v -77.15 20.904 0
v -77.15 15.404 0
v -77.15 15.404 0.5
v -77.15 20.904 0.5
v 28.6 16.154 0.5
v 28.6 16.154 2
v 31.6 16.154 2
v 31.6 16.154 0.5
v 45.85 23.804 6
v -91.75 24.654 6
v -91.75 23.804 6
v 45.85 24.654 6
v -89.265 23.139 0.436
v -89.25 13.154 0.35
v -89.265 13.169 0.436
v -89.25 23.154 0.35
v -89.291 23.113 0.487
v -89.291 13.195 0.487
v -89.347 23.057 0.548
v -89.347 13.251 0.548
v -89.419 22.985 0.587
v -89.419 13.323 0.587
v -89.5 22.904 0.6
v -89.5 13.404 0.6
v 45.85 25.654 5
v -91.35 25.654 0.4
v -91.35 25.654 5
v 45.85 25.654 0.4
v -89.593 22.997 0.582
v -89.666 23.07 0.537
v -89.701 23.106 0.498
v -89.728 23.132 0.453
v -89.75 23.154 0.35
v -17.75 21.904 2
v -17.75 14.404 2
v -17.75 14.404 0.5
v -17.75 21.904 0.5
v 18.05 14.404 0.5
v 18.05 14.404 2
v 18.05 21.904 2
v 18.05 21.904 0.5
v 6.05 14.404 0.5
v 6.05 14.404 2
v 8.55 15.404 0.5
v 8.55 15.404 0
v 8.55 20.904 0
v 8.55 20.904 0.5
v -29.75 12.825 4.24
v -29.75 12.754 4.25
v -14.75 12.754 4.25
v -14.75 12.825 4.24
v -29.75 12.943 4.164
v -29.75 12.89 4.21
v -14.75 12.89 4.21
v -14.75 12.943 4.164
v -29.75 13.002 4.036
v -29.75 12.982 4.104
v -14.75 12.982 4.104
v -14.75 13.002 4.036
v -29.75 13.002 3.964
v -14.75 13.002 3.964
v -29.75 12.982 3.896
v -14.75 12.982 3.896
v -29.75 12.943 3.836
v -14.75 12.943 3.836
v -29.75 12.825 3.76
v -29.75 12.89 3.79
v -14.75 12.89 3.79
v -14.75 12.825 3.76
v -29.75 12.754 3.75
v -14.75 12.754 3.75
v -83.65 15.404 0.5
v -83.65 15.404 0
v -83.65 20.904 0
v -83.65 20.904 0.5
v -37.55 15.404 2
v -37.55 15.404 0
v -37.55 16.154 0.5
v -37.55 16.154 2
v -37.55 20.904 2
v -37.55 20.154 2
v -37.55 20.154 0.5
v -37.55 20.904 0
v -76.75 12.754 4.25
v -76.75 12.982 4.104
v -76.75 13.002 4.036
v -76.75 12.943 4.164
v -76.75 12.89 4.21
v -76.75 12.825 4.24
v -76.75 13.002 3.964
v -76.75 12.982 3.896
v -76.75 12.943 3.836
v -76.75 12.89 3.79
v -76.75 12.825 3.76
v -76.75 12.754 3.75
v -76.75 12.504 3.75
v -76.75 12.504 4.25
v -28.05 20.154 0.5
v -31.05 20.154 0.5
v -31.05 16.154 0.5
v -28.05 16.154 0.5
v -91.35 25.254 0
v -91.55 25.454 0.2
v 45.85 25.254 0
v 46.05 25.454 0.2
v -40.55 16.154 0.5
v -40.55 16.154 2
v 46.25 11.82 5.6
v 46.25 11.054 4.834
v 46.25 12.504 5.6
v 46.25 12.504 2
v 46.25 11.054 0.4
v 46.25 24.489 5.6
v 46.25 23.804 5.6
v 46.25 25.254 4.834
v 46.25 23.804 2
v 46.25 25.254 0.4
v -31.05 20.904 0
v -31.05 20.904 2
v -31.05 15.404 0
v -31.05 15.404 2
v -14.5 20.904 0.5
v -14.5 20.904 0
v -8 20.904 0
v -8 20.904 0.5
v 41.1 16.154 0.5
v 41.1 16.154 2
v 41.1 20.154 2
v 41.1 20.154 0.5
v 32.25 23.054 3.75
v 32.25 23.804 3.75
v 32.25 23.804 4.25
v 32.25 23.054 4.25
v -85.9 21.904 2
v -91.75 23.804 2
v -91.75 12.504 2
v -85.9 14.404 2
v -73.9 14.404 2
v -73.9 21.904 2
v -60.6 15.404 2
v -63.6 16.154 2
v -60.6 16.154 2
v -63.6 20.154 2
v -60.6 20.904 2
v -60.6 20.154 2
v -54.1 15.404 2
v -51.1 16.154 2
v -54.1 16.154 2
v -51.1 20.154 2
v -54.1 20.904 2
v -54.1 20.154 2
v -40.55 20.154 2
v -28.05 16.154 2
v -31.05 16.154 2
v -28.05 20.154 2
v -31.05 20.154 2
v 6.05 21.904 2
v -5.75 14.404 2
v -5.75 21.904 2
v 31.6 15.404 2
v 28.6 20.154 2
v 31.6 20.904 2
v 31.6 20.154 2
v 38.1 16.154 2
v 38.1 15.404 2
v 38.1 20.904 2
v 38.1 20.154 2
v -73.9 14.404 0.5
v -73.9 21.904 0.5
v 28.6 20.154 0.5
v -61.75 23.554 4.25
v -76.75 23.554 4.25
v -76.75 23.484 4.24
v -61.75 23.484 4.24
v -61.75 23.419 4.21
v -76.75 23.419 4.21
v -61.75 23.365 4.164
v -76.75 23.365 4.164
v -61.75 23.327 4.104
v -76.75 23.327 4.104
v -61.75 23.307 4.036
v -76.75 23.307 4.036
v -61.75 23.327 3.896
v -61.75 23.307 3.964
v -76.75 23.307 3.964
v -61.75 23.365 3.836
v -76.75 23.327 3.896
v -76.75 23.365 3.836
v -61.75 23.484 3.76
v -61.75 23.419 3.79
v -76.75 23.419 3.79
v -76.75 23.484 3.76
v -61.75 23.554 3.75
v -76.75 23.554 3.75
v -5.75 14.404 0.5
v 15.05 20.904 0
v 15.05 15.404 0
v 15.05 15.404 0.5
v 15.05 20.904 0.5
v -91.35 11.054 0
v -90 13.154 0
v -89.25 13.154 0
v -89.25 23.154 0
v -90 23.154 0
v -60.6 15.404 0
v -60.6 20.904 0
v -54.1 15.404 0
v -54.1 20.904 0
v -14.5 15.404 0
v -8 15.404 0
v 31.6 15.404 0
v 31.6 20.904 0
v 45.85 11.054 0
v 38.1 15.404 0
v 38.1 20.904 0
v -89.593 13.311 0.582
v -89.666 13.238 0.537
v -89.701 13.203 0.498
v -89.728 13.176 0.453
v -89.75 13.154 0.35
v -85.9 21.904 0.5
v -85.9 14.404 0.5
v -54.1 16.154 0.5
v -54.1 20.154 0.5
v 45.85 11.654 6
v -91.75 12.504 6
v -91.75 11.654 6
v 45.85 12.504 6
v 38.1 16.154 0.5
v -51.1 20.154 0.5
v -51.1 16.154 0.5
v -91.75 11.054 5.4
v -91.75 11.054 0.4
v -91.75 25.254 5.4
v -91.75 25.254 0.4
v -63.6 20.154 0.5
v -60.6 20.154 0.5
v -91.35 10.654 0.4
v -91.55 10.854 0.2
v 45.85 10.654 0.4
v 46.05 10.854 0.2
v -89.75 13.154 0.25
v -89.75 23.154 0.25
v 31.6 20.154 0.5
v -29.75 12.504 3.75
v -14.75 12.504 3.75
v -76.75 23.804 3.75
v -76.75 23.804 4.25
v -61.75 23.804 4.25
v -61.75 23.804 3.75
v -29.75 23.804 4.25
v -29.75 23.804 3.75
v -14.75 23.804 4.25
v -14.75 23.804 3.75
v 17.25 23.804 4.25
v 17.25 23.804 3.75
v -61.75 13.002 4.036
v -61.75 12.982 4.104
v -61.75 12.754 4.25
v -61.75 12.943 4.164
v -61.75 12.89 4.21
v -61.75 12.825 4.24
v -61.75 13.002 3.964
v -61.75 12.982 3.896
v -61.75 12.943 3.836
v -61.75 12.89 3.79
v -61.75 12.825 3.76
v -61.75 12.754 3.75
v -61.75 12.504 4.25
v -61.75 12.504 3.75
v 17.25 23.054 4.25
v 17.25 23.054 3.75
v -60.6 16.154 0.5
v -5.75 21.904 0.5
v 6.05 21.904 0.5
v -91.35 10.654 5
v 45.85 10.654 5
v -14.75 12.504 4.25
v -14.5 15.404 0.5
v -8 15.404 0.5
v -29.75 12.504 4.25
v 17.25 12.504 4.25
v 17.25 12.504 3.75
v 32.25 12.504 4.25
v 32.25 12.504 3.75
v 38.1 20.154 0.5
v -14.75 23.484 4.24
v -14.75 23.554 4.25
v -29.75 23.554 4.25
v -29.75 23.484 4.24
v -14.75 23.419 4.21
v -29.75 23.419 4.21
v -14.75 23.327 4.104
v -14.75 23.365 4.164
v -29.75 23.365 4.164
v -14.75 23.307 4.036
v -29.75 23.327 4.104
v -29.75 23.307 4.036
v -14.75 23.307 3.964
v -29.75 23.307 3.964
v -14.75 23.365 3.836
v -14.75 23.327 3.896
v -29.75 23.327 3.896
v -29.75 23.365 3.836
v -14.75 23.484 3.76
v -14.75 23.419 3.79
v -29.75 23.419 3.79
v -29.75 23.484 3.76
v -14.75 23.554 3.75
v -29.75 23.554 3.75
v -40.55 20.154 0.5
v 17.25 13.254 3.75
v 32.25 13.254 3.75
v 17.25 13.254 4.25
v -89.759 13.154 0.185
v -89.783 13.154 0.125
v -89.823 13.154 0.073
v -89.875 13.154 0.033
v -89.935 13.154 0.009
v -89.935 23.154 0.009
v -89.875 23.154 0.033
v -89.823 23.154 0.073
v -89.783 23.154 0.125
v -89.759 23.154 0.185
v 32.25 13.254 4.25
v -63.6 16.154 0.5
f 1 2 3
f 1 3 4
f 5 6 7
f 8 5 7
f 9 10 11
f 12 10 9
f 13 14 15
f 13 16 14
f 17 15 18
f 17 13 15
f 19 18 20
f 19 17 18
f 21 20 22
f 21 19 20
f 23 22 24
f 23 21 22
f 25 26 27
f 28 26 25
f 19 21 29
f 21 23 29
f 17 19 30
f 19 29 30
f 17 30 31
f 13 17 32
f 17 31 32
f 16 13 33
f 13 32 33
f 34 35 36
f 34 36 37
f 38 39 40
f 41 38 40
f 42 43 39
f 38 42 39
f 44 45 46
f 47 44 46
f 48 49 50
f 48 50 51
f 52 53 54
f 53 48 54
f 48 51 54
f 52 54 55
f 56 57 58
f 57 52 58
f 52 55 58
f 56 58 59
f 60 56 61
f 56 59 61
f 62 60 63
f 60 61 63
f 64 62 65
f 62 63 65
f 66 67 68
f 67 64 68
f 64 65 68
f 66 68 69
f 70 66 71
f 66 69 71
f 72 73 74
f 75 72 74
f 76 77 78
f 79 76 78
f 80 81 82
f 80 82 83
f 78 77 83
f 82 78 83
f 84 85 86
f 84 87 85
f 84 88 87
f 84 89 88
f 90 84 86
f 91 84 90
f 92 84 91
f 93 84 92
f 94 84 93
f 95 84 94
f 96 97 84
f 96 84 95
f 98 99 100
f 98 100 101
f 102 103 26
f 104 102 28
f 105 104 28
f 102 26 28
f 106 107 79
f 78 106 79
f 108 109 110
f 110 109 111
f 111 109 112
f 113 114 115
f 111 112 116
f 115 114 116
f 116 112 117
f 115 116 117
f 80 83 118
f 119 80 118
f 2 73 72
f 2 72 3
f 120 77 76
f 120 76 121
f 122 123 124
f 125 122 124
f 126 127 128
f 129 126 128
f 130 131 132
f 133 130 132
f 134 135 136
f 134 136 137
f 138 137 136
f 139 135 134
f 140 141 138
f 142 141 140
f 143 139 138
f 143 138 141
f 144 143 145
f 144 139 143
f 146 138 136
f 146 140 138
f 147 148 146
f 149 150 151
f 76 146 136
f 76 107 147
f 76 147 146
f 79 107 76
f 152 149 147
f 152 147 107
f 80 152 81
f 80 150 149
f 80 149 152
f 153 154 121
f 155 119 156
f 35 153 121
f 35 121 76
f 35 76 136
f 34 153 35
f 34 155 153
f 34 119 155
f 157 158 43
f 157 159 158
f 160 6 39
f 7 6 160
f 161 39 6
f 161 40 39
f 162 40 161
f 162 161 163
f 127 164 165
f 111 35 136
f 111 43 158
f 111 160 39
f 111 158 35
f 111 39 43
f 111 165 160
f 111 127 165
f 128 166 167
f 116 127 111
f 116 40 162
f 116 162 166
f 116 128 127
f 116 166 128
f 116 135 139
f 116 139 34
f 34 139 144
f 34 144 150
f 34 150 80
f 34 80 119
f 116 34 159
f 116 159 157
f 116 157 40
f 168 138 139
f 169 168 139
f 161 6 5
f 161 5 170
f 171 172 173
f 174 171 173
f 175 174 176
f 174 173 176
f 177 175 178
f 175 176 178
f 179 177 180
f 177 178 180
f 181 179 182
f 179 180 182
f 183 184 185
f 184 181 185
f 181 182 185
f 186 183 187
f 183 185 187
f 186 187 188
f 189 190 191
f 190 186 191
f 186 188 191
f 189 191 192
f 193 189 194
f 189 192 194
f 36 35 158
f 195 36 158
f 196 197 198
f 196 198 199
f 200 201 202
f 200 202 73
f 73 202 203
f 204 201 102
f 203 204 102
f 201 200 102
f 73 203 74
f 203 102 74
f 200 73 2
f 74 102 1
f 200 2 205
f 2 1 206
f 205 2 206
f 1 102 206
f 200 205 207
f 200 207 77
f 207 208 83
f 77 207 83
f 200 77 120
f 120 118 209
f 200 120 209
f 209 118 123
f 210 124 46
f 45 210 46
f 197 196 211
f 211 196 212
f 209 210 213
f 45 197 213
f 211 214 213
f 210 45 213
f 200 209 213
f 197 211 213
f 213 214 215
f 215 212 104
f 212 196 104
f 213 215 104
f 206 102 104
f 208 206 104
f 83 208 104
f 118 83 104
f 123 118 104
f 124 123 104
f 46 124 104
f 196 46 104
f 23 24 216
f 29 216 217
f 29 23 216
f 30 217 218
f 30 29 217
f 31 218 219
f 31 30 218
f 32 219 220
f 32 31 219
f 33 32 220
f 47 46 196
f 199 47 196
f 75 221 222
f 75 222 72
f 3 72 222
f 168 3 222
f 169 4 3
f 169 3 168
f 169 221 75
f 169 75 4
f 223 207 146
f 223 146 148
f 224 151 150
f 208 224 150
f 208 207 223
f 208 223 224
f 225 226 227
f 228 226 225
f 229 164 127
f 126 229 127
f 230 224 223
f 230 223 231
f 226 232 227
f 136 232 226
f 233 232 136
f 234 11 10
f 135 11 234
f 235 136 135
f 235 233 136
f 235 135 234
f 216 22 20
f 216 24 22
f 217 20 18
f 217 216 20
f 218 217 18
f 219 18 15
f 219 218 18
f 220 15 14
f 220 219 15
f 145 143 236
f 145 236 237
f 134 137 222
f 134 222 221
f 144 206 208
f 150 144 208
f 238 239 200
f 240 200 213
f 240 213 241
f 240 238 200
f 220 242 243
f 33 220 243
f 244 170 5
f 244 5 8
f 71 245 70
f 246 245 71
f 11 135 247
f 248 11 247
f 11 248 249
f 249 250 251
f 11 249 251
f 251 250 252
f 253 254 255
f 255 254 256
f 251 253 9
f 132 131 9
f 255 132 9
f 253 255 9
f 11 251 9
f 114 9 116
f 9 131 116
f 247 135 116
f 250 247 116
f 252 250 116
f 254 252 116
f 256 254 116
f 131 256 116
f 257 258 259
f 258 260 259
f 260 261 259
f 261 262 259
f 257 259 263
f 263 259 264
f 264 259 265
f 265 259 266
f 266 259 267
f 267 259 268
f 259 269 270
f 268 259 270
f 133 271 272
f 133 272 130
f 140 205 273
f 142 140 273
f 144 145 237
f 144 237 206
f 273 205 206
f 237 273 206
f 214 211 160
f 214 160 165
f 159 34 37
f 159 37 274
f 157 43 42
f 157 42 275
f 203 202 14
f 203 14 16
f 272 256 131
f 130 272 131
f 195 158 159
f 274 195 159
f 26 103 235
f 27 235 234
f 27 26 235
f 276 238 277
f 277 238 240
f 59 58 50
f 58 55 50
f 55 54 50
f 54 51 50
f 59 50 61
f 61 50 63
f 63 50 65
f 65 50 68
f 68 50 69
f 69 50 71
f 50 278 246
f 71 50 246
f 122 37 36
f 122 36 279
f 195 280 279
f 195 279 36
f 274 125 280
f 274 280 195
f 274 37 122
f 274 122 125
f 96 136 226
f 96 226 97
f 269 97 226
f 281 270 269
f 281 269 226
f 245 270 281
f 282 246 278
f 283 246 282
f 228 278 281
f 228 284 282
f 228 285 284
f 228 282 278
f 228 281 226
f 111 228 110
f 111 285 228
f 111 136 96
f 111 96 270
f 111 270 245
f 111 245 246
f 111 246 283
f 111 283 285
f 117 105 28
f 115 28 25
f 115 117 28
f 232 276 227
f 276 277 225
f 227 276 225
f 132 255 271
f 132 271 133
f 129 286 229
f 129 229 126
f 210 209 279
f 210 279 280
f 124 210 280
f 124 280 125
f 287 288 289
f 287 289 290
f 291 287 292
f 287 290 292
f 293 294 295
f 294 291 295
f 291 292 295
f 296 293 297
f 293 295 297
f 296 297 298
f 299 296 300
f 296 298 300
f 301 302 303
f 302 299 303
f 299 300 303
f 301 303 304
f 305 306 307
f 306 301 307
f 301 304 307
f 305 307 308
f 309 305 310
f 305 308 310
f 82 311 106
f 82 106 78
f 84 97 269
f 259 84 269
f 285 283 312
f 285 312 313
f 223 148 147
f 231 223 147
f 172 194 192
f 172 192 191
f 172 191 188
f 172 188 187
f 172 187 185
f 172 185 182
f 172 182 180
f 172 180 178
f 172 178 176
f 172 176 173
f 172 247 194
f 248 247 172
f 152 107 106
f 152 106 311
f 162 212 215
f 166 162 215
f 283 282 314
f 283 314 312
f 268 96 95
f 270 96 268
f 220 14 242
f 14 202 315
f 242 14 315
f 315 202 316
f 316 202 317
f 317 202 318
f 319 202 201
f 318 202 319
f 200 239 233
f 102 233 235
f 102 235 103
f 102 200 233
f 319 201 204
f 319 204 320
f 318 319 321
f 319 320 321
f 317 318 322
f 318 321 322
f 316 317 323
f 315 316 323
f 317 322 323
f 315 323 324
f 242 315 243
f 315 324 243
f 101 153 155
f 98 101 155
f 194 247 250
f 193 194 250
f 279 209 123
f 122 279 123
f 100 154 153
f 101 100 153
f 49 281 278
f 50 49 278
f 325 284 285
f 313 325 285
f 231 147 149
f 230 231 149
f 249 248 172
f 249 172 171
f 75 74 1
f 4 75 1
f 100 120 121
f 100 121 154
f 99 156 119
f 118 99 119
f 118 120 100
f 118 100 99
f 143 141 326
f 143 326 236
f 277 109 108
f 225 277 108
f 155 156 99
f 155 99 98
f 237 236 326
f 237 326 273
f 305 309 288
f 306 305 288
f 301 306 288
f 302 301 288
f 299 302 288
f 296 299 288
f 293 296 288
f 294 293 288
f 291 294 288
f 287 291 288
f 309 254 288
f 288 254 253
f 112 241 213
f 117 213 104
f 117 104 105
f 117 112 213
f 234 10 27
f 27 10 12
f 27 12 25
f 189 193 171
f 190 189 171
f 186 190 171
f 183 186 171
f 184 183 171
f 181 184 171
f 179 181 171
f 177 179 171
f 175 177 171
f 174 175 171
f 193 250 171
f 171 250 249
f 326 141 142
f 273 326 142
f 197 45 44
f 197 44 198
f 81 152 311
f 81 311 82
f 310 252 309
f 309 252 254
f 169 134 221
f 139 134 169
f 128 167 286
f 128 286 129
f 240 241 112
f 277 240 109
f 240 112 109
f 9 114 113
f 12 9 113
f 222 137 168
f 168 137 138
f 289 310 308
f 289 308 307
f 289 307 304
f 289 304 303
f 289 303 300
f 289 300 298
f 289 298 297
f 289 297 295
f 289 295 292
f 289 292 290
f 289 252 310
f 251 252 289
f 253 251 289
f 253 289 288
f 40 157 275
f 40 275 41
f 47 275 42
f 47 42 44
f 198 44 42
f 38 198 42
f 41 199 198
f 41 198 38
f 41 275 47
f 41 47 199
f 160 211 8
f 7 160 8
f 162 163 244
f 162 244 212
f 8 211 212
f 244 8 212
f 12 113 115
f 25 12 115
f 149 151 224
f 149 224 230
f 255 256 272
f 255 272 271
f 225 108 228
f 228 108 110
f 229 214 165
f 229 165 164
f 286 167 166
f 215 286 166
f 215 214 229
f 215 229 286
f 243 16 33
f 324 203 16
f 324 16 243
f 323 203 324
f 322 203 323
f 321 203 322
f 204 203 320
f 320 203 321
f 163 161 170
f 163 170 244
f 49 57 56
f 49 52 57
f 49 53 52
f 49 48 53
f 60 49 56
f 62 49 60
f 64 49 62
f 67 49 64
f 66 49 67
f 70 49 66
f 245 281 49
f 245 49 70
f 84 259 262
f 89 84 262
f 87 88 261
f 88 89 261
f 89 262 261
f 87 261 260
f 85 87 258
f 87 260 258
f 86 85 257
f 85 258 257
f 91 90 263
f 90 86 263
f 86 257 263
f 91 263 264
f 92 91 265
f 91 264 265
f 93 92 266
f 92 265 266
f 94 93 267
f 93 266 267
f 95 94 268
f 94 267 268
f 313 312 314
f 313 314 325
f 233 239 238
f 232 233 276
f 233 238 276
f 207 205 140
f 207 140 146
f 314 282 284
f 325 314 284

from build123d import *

# Parameters (mm, degrees)
SKETCH1_W               = 138
SKETCH1_H               = 15
BOSS_EXTRUDE1_DEPTH     = 6
CUT_EXTRUDE1_DEPTH      = 96.457872636
CUT_EXTRUDE1_DEPTH_BACK = 96.457872636
SKETCH2_W               = 6.5
SKETCH2_H               = 5.5
CUT_EXTRUDE2_DEPTH      = 96.457872636
CUT_EXTRUDE2_DEPTH_BACK = 96.457872636
SKETCH3_W               = 6.5
SKETCH3_H               = 5.5
CUT_EXTRUDE3_DEPTH      = 96.457872636
CUT_EXTRUDE3_DEPTH_BACK = 96.457872636
SKETCH4_W               = 6.5
SKETCH4_H               = 5.5
CUT_EXTRUDE4_DEPTH      = 96.457872636
CUT_EXTRUDE4_DEPTH_BACK = 96.457872636
SKETCH5_W               = 6.5
SKETCH5_H               = 5.5
CUT_EXTRUDE5_DEPTH      = 96.457872636
CUT_EXTRUDE5_DEPTH_BACK = 4
SKETCH8_W               = 138
SKETCH8_H               = 11.3
SKETCH9_W               = 12
SKETCH9_H               = 7.5
SKETCH9_W_2             = 12.5
SKETCH9_H_2             = 4
CUT_EXTRUDE6_DEPTH      = 1.5
SKETCH10_W              = 12.5
SKETCH10_H              = 4
CUT_EXTRUDE7_DEPTH      = 1.5
CUT_EXTRUDE8_DEPTH      = 138
SKETCH13_W              = 0.5
SKETCH13_H              = 10
CUT_EXTRUDE9_DEPTH      = 0.6
FILLET1_R               = 0.25
FILLET2_R               = 0.25
SKETCH16_W              = 15
SKETCH16_H              = 0.5
BOSS_EXTRUDE2_DEPTH     = 0.75
FILLET3_R               = 0.5
FILLET4_R               = 0.25
SKETCH17_W              = 15
SKETCH17_H              = 0.5
BOSS_EXTRUDE3_DEPTH     = 0.75
FILLET5_R               = 0.5
FILLET6_R               = 0.25
LPATTERN1_COUNT         = 3
LPATTERN1_PITCH         = 47
LPATTERN2_COUNT         = 3
LPATTERN2_PITCH         = 47
FILLET7_R               = 0.5
FILLET8_R               = 0.25
FILLET9_R               = 0.5
FILLET10_R              = 0.25
CHAMFER1_SIZE           = 0.4
CHAMFER2_SIZE           = 0.4
CHAMFER3_SIZE           = 0.4
CHAMFER5_SIZE           = 0.4


# Some blends are built 0.0001 mm under size
with BuildPart() as part:
    # Sketch1 → Boss-Extrude1 (new body)
    with BuildSketch(Plane.XY):
        with Locations((-22.75, 18.154296875)):
            Rectangle(SKETCH1_W, SKETCH1_H)
    extrude(amount=BOSS_EXTRUDE1_DEPTH)

    # Sketch2 → Cut-Extrude1 (cut, two sides: drawn at the far end of the back side and taken through both)
    with BuildSketch(Plane.XY.offset(6).offset(-CUT_EXTRUDE1_DEPTH_BACK)):
        with Locations((-80.4, 18.154296875)):
            Rectangle(SKETCH2_W, SKETCH2_H)
    extrude(amount=CUT_EXTRUDE1_DEPTH + CUT_EXTRUDE1_DEPTH_BACK, mode=Mode.SUBTRACT)

    # Sketch3 → Cut-Extrude2 (cut, two sides: drawn at the far end of the back side and taken through both)
    with BuildSketch(Plane.XY.offset(6).offset(-CUT_EXTRUDE2_DEPTH_BACK)):
        with Locations((-57.35, 18.154296875)):
            Rectangle(SKETCH3_W, SKETCH3_H)
    extrude(amount=CUT_EXTRUDE2_DEPTH + CUT_EXTRUDE2_DEPTH_BACK, mode=Mode.SUBTRACT)

    # Sketch4 → Cut-Extrude3 (cut, two sides: drawn at the far end of the back side and taken through both)
    with BuildSketch(Plane.XY.offset(6).offset(-CUT_EXTRUDE3_DEPTH_BACK)):
        with Locations((-34.3, 18.154296875)):
            Rectangle(SKETCH4_W, SKETCH4_H)
    extrude(amount=CUT_EXTRUDE3_DEPTH + CUT_EXTRUDE3_DEPTH_BACK, mode=Mode.SUBTRACT)

    # Sketch5 → Cut-Extrude4 (cut, two sides: drawn at the far end of the back side and taken through both)
    with BuildSketch(Plane.XY.offset(6).offset(-CUT_EXTRUDE4_DEPTH_BACK)):
        with Locations((-11.25, 18.154296875)):
            Rectangle(SKETCH5_W, SKETCH5_H)
        with Locations((11.8, 18.154296875)):
            Rectangle(SKETCH5_W, SKETCH5_H)
        with Locations((34.85, 18.154296875)):
            Rectangle(SKETCH5_W, SKETCH5_H)
    extrude(amount=CUT_EXTRUDE4_DEPTH + CUT_EXTRUDE4_DEPTH_BACK, mode=Mode.SUBTRACT)

    # Sketch8 → Cut-Extrude5 (cut, two sides: drawn at the far end of the back side and taken through both)
    with BuildSketch(Plane.XY.offset(6).offset(-CUT_EXTRUDE5_DEPTH_BACK)):
        with Locations((-22.75, 18.154296875)):
            Rectangle(SKETCH8_W, SKETCH8_H)
    extrude(amount=CUT_EXTRUDE5_DEPTH + CUT_EXTRUDE5_DEPTH_BACK, mode=Mode.SUBTRACT)

    # Sketch9 → Cut-Extrude6 (cut)
    with BuildSketch(Plane.XY.offset(2)):
        with Locations((-11.75, 18.154296875)):
            Rectangle(SKETCH9_W, SKETCH9_H)
        with Locations((12.05, 18.154296875)):
            Rectangle(SKETCH9_W, SKETCH9_H)
        with Locations((-79.9, 18.154296875)):
            Rectangle(SKETCH9_W, SKETCH9_H)
        with Locations((34.85, 18.154296875)):
            Rectangle(SKETCH9_W_2, SKETCH9_H_2)
    extrude(amount=-CUT_EXTRUDE6_DEPTH, mode=Mode.SUBTRACT)

    # Sketch10 → Cut-Extrude7 (cut)
    with BuildSketch(Plane.XY.offset(2)):
        with Locations((-34.3, 18.154296875)):
            Rectangle(SKETCH10_W, SKETCH10_H)
        with Locations((-57.35, 18.154296875)):
            Rectangle(SKETCH10_W, SKETCH10_H)
    extrude(amount=-CUT_EXTRUDE7_DEPTH, mode=Mode.SUBTRACT)

    # Sketch12 → Cut-Extrude8 (cut)
    with BuildSketch(Plane(origin=(46.25, 0, 0), x_dir=(0, 0, -1), z_dir=(1, 0, 0))):
        Polygon((-6, 25.654296875), (-6, 24.654296875), (-5, 25.654296875), align=None)
        Polygon((-6, 10.654296875), (-5, 10.654296875), (-6, 11.654296875), align=None)
    extrude(amount=-CUT_EXTRUDE8_DEPTH, mode=Mode.SUBTRACT)

    # Sketch13 → Cut-Extrude9 (cut)
    with BuildSketch(Plane(origin=(0, 0, 0), x_dir=(-1, 0, 0), z_dir=(0, 0, -1))):
        with Locations((89.5, 18.154296875)):
            Rectangle(SKETCH13_W, SKETCH13_H)
    extrude(amount=-CUT_EXTRUDE9_DEPTH, mode=Mode.SUBTRACT)

    # Fillet1
    fillet1_edges = [part.edges().sort_by_distance(p)[0] for p in [
        (-89.75, 18.154296875, 0),
    ]]
    fillet(fillet1_edges, radius=FILLET1_R)

    # Fillet2
    fillet2_edges = [part.edges().sort_by_distance(p)[0] for p in [
        (-89.25, 18.154296875, 0.6),
        (-89.5, 23.154296875, 0.6),
        (-89.75, 18.154296875, 0.6),
        (-89.5, 13.154296875, 0.6),
    ]]
    fillet(fillet2_edges, radius=FILLET2_R - 0.0001)  # a hair under: the kernel refuses the full size

    # Sketch16 → Boss-Extrude2 (add)
    with BuildSketch(Plane.XZ.offset(-23.804296875)):
        with Locations((-69.25, 4)):
            Rectangle(SKETCH16_W, SKETCH16_H)
    boss_extrude2 = extrude(amount=BOSS_EXTRUDE2_DEPTH)

    # Fillet3
    fillet3_edges = [part.edges().sort_by_distance(p)[0] for p in [
        (-69.25, 23.054296875, 4.25),
    ]]
    fillet(fillet3_edges, radius=FILLET3_R - 0.0001)  # a hair under: the kernel refuses the full size

    # Fillet4
    # the kernel refuses this fillet: 0.25 mm, written as the material it takes off along each edge
    with BuildSketch(Plane(origin=(-78.517583771, 23.054296875, 3.75), x_dir=(0, 0.7070334963750315, 0.7071800584035852), z_dir=(1, 0, 0))) as fillet4_piece_1:
        with BuildLine():
            CenterArc((0.530239778, -0.176759656), FILLET4_R, 44.994477546, 179.999584605)
            Line((0.353444764, -0.35351803), (0.335765262, -0.371193867))
            Line((0.335765262, -0.371193867), (-0.017679501, -0.017675837))
            Line((-0.017679501, -0.017675837), (-0.017675837, 0.017679501))
            ThreePointArc((-0.017675837, 0.017679501), (-0.017605119, 0.017750205), (0.724712885, 0.017675966))
            Line((0.724712885, 0.017675966), (0.707033512, 0))
        make_face()
    extrude(amount=18.535167542, mode=Mode.SUBTRACT)

    # Sketch17 → Boss-Extrude3 (add)
    with BuildSketch(Plane(origin=(0, 12.504296875, 0), x_dir=(1, 0, 0), z_dir=(0, 1, 0))):
        with Locations((-69.25, -4)):
            Rectangle(SKETCH17_W, SKETCH17_H)
    boss_extrude3 = extrude(amount=BOSS_EXTRUDE3_DEPTH)

    # Fillet5
    fillet5_edges = [part.edges().sort_by_distance(p)[0] for p in [
        (-69.25, 13.254296875, 4.25),
    ]]
    fillet(fillet5_edges, radius=FILLET5_R - 0.0001)  # a hair under: the kernel refuses the full size

    # Fillet6
    # the kernel refuses this fillet: 0.25 mm, written as the material it takes off along each edge
    with BuildSketch(Plane(origin=(-59.982416237, 13.254296875, 3.75), x_dir=(0, -0.707033490014658, 0.7071800647626406), z_dir=(-1, 0, 0))) as fillet6_piece_1:
        with BuildLine():
            CenterArc((0.530239774, -0.176759657), FILLET6_R, 44.994478062, 179.999583575)
            Line((0.353444757, -0.35351803), (0.335765256, -0.371193867))
            Line((0.335765256, -0.371193867), (-0.017679502, -0.017675837))
            Line((-0.017679502, -0.017675837), (-0.017675837, 0.017679502))
            ThreePointArc((-0.017675837, 0.017679502), (-0.017605119, 0.017750205), (0.724712878, 0.017675966))
            Line((0.724712878, 0.017675966), (0.707033505, 0))
        make_face()
    extrude(amount=18.535167526, mode=Mode.SUBTRACT)

    # LPattern1: Boss-Extrude3 ×3
    with Locations(*[(i * LPATTERN1_PITCH, 0, 0) for i in range(1, LPATTERN1_COUNT)]):
        add(boss_extrude3)

    # LPattern2: Boss-Extrude2 ×3
    with Locations(*[(i * LPATTERN2_PITCH, 0, 0) for i in range(1, LPATTERN2_COUNT)]):
        add(boss_extrude2)

    # Fillet7
    fillet7_edges = [part.edges().sort_by_distance(p)[0] for p in [
        (-22.25, 23.054296875, 4.25),
    ]]
    fillet(fillet7_edges, radius=FILLET7_R - 0.0001)  # a hair under: the kernel refuses the full size

    # Fillet8
    # the kernel refuses this fillet: 0.25 mm, written as the material it takes off along each edge
    with BuildSketch(Plane(origin=(-31.517583771, 23.054296875, 3.75), x_dir=(0, 0.7070334900866685, 0.707180064690645), z_dir=(1, 0, 0))) as fillet8_piece_1:
        with BuildLine():
            CenterArc((0.530239774, -0.176759657), FILLET8_R, 44.994478056, 179.999583586)
            Line((0.353444758, -0.35351803), (0.335765256, -0.371193867))
            Line((0.335765256, -0.371193867), (-0.017679502, -0.017675837))
            Line((-0.017679502, -0.017675837), (-0.017675837, 0.017679502))
            ThreePointArc((-0.017675837, 0.017679502), (-0.017605119, 0.017750205), (0.724712878, 0.017675966))
            Line((0.724712878, 0.017675966), (0.707033505, 0))
        make_face()
    extrude(amount=18.535167542, mode=Mode.SUBTRACT)

    # Fillet9
    fillet9_edges = [part.edges().sort_by_distance(p)[0] for p in [
        (-22.25, 13.254296875, 4.25),
    ]]
    fillet(fillet9_edges, radius=FILLET9_R - 0.0001)  # a hair under: the kernel refuses the full size

    # Fillet10
    # the kernel refuses this fillet: 0.25 mm, written as the material it takes off along each edge
    with BuildSketch(Plane(origin=(-12.982416233, 13.254296875, 3.75), x_dir=(0, -0.7070334900159922, 0.7071800647613065), z_dir=(-1, 0, 0))) as fillet10_piece_1:
        with BuildLine():
            CenterArc((0.530239774, -0.176759657), FILLET10_R, 44.994478062, 179.999583575)
            Line((0.353444757, -0.35351803), (0.335765256, -0.371193867))
            Line((0.335765256, -0.371193867), (-0.017679502, -0.017675837))
            Line((-0.017679502, -0.017675837), (-0.017675837, 0.017679502))
            ThreePointArc((-0.017675837, 0.017679502), (-0.017605119, 0.017750205), (0.724712878, 0.017675966))
            Line((0.724712878, 0.017675966), (0.707033505, 0))
        make_face()
    extrude(amount=18.535167534, mode=Mode.SUBTRACT)

    # Chamfer1
    chamfer1_edges = [part.edges().sort_by_distance(p)[0] for p in [
        (-22.75, 25.654296875, 0),
        (-22.75, 10.654296875, 0),
    ]]
    chamfer(chamfer1_edges, length=CHAMFER1_SIZE)

    # Chamfer2
    chamfer2_edges = [part.edges().sort_by_distance(p)[0] for p in [
        (46.25, 18.154296875, 0),
        (-91.75, 18.154296875, 0),
    ]]
    chamfer(chamfer2_edges, length=CHAMFER2_SIZE)

    # Chamfer3
    chamfer3_edges = [part.edges().sort_by_distance(p)[0] for p in [
        (-91.75, 25.654296875, 2.7),
        (-91.75, 10.654296875, 2.7),
    ]]
    chamfer(chamfer3_edges, length=CHAMFER3_SIZE)

    # Chamfer5
    chamfer5_edges = [part.edges().sort_by_distance(p)[0] for p in [
        (46.25, 24.229296875, 6),
        (46.25, 25.654296875, 2.7),
        (46.25, 10.654296875, 2.7),
        (46.25, 12.079296875, 6),
        (46.25, 25.154296875, 5.5),
        (46.25, 11.154296875, 5.5),
    ]]
    chamfer(chamfer5_edges, length=CHAMFER5_SIZE)


solid = part.part
